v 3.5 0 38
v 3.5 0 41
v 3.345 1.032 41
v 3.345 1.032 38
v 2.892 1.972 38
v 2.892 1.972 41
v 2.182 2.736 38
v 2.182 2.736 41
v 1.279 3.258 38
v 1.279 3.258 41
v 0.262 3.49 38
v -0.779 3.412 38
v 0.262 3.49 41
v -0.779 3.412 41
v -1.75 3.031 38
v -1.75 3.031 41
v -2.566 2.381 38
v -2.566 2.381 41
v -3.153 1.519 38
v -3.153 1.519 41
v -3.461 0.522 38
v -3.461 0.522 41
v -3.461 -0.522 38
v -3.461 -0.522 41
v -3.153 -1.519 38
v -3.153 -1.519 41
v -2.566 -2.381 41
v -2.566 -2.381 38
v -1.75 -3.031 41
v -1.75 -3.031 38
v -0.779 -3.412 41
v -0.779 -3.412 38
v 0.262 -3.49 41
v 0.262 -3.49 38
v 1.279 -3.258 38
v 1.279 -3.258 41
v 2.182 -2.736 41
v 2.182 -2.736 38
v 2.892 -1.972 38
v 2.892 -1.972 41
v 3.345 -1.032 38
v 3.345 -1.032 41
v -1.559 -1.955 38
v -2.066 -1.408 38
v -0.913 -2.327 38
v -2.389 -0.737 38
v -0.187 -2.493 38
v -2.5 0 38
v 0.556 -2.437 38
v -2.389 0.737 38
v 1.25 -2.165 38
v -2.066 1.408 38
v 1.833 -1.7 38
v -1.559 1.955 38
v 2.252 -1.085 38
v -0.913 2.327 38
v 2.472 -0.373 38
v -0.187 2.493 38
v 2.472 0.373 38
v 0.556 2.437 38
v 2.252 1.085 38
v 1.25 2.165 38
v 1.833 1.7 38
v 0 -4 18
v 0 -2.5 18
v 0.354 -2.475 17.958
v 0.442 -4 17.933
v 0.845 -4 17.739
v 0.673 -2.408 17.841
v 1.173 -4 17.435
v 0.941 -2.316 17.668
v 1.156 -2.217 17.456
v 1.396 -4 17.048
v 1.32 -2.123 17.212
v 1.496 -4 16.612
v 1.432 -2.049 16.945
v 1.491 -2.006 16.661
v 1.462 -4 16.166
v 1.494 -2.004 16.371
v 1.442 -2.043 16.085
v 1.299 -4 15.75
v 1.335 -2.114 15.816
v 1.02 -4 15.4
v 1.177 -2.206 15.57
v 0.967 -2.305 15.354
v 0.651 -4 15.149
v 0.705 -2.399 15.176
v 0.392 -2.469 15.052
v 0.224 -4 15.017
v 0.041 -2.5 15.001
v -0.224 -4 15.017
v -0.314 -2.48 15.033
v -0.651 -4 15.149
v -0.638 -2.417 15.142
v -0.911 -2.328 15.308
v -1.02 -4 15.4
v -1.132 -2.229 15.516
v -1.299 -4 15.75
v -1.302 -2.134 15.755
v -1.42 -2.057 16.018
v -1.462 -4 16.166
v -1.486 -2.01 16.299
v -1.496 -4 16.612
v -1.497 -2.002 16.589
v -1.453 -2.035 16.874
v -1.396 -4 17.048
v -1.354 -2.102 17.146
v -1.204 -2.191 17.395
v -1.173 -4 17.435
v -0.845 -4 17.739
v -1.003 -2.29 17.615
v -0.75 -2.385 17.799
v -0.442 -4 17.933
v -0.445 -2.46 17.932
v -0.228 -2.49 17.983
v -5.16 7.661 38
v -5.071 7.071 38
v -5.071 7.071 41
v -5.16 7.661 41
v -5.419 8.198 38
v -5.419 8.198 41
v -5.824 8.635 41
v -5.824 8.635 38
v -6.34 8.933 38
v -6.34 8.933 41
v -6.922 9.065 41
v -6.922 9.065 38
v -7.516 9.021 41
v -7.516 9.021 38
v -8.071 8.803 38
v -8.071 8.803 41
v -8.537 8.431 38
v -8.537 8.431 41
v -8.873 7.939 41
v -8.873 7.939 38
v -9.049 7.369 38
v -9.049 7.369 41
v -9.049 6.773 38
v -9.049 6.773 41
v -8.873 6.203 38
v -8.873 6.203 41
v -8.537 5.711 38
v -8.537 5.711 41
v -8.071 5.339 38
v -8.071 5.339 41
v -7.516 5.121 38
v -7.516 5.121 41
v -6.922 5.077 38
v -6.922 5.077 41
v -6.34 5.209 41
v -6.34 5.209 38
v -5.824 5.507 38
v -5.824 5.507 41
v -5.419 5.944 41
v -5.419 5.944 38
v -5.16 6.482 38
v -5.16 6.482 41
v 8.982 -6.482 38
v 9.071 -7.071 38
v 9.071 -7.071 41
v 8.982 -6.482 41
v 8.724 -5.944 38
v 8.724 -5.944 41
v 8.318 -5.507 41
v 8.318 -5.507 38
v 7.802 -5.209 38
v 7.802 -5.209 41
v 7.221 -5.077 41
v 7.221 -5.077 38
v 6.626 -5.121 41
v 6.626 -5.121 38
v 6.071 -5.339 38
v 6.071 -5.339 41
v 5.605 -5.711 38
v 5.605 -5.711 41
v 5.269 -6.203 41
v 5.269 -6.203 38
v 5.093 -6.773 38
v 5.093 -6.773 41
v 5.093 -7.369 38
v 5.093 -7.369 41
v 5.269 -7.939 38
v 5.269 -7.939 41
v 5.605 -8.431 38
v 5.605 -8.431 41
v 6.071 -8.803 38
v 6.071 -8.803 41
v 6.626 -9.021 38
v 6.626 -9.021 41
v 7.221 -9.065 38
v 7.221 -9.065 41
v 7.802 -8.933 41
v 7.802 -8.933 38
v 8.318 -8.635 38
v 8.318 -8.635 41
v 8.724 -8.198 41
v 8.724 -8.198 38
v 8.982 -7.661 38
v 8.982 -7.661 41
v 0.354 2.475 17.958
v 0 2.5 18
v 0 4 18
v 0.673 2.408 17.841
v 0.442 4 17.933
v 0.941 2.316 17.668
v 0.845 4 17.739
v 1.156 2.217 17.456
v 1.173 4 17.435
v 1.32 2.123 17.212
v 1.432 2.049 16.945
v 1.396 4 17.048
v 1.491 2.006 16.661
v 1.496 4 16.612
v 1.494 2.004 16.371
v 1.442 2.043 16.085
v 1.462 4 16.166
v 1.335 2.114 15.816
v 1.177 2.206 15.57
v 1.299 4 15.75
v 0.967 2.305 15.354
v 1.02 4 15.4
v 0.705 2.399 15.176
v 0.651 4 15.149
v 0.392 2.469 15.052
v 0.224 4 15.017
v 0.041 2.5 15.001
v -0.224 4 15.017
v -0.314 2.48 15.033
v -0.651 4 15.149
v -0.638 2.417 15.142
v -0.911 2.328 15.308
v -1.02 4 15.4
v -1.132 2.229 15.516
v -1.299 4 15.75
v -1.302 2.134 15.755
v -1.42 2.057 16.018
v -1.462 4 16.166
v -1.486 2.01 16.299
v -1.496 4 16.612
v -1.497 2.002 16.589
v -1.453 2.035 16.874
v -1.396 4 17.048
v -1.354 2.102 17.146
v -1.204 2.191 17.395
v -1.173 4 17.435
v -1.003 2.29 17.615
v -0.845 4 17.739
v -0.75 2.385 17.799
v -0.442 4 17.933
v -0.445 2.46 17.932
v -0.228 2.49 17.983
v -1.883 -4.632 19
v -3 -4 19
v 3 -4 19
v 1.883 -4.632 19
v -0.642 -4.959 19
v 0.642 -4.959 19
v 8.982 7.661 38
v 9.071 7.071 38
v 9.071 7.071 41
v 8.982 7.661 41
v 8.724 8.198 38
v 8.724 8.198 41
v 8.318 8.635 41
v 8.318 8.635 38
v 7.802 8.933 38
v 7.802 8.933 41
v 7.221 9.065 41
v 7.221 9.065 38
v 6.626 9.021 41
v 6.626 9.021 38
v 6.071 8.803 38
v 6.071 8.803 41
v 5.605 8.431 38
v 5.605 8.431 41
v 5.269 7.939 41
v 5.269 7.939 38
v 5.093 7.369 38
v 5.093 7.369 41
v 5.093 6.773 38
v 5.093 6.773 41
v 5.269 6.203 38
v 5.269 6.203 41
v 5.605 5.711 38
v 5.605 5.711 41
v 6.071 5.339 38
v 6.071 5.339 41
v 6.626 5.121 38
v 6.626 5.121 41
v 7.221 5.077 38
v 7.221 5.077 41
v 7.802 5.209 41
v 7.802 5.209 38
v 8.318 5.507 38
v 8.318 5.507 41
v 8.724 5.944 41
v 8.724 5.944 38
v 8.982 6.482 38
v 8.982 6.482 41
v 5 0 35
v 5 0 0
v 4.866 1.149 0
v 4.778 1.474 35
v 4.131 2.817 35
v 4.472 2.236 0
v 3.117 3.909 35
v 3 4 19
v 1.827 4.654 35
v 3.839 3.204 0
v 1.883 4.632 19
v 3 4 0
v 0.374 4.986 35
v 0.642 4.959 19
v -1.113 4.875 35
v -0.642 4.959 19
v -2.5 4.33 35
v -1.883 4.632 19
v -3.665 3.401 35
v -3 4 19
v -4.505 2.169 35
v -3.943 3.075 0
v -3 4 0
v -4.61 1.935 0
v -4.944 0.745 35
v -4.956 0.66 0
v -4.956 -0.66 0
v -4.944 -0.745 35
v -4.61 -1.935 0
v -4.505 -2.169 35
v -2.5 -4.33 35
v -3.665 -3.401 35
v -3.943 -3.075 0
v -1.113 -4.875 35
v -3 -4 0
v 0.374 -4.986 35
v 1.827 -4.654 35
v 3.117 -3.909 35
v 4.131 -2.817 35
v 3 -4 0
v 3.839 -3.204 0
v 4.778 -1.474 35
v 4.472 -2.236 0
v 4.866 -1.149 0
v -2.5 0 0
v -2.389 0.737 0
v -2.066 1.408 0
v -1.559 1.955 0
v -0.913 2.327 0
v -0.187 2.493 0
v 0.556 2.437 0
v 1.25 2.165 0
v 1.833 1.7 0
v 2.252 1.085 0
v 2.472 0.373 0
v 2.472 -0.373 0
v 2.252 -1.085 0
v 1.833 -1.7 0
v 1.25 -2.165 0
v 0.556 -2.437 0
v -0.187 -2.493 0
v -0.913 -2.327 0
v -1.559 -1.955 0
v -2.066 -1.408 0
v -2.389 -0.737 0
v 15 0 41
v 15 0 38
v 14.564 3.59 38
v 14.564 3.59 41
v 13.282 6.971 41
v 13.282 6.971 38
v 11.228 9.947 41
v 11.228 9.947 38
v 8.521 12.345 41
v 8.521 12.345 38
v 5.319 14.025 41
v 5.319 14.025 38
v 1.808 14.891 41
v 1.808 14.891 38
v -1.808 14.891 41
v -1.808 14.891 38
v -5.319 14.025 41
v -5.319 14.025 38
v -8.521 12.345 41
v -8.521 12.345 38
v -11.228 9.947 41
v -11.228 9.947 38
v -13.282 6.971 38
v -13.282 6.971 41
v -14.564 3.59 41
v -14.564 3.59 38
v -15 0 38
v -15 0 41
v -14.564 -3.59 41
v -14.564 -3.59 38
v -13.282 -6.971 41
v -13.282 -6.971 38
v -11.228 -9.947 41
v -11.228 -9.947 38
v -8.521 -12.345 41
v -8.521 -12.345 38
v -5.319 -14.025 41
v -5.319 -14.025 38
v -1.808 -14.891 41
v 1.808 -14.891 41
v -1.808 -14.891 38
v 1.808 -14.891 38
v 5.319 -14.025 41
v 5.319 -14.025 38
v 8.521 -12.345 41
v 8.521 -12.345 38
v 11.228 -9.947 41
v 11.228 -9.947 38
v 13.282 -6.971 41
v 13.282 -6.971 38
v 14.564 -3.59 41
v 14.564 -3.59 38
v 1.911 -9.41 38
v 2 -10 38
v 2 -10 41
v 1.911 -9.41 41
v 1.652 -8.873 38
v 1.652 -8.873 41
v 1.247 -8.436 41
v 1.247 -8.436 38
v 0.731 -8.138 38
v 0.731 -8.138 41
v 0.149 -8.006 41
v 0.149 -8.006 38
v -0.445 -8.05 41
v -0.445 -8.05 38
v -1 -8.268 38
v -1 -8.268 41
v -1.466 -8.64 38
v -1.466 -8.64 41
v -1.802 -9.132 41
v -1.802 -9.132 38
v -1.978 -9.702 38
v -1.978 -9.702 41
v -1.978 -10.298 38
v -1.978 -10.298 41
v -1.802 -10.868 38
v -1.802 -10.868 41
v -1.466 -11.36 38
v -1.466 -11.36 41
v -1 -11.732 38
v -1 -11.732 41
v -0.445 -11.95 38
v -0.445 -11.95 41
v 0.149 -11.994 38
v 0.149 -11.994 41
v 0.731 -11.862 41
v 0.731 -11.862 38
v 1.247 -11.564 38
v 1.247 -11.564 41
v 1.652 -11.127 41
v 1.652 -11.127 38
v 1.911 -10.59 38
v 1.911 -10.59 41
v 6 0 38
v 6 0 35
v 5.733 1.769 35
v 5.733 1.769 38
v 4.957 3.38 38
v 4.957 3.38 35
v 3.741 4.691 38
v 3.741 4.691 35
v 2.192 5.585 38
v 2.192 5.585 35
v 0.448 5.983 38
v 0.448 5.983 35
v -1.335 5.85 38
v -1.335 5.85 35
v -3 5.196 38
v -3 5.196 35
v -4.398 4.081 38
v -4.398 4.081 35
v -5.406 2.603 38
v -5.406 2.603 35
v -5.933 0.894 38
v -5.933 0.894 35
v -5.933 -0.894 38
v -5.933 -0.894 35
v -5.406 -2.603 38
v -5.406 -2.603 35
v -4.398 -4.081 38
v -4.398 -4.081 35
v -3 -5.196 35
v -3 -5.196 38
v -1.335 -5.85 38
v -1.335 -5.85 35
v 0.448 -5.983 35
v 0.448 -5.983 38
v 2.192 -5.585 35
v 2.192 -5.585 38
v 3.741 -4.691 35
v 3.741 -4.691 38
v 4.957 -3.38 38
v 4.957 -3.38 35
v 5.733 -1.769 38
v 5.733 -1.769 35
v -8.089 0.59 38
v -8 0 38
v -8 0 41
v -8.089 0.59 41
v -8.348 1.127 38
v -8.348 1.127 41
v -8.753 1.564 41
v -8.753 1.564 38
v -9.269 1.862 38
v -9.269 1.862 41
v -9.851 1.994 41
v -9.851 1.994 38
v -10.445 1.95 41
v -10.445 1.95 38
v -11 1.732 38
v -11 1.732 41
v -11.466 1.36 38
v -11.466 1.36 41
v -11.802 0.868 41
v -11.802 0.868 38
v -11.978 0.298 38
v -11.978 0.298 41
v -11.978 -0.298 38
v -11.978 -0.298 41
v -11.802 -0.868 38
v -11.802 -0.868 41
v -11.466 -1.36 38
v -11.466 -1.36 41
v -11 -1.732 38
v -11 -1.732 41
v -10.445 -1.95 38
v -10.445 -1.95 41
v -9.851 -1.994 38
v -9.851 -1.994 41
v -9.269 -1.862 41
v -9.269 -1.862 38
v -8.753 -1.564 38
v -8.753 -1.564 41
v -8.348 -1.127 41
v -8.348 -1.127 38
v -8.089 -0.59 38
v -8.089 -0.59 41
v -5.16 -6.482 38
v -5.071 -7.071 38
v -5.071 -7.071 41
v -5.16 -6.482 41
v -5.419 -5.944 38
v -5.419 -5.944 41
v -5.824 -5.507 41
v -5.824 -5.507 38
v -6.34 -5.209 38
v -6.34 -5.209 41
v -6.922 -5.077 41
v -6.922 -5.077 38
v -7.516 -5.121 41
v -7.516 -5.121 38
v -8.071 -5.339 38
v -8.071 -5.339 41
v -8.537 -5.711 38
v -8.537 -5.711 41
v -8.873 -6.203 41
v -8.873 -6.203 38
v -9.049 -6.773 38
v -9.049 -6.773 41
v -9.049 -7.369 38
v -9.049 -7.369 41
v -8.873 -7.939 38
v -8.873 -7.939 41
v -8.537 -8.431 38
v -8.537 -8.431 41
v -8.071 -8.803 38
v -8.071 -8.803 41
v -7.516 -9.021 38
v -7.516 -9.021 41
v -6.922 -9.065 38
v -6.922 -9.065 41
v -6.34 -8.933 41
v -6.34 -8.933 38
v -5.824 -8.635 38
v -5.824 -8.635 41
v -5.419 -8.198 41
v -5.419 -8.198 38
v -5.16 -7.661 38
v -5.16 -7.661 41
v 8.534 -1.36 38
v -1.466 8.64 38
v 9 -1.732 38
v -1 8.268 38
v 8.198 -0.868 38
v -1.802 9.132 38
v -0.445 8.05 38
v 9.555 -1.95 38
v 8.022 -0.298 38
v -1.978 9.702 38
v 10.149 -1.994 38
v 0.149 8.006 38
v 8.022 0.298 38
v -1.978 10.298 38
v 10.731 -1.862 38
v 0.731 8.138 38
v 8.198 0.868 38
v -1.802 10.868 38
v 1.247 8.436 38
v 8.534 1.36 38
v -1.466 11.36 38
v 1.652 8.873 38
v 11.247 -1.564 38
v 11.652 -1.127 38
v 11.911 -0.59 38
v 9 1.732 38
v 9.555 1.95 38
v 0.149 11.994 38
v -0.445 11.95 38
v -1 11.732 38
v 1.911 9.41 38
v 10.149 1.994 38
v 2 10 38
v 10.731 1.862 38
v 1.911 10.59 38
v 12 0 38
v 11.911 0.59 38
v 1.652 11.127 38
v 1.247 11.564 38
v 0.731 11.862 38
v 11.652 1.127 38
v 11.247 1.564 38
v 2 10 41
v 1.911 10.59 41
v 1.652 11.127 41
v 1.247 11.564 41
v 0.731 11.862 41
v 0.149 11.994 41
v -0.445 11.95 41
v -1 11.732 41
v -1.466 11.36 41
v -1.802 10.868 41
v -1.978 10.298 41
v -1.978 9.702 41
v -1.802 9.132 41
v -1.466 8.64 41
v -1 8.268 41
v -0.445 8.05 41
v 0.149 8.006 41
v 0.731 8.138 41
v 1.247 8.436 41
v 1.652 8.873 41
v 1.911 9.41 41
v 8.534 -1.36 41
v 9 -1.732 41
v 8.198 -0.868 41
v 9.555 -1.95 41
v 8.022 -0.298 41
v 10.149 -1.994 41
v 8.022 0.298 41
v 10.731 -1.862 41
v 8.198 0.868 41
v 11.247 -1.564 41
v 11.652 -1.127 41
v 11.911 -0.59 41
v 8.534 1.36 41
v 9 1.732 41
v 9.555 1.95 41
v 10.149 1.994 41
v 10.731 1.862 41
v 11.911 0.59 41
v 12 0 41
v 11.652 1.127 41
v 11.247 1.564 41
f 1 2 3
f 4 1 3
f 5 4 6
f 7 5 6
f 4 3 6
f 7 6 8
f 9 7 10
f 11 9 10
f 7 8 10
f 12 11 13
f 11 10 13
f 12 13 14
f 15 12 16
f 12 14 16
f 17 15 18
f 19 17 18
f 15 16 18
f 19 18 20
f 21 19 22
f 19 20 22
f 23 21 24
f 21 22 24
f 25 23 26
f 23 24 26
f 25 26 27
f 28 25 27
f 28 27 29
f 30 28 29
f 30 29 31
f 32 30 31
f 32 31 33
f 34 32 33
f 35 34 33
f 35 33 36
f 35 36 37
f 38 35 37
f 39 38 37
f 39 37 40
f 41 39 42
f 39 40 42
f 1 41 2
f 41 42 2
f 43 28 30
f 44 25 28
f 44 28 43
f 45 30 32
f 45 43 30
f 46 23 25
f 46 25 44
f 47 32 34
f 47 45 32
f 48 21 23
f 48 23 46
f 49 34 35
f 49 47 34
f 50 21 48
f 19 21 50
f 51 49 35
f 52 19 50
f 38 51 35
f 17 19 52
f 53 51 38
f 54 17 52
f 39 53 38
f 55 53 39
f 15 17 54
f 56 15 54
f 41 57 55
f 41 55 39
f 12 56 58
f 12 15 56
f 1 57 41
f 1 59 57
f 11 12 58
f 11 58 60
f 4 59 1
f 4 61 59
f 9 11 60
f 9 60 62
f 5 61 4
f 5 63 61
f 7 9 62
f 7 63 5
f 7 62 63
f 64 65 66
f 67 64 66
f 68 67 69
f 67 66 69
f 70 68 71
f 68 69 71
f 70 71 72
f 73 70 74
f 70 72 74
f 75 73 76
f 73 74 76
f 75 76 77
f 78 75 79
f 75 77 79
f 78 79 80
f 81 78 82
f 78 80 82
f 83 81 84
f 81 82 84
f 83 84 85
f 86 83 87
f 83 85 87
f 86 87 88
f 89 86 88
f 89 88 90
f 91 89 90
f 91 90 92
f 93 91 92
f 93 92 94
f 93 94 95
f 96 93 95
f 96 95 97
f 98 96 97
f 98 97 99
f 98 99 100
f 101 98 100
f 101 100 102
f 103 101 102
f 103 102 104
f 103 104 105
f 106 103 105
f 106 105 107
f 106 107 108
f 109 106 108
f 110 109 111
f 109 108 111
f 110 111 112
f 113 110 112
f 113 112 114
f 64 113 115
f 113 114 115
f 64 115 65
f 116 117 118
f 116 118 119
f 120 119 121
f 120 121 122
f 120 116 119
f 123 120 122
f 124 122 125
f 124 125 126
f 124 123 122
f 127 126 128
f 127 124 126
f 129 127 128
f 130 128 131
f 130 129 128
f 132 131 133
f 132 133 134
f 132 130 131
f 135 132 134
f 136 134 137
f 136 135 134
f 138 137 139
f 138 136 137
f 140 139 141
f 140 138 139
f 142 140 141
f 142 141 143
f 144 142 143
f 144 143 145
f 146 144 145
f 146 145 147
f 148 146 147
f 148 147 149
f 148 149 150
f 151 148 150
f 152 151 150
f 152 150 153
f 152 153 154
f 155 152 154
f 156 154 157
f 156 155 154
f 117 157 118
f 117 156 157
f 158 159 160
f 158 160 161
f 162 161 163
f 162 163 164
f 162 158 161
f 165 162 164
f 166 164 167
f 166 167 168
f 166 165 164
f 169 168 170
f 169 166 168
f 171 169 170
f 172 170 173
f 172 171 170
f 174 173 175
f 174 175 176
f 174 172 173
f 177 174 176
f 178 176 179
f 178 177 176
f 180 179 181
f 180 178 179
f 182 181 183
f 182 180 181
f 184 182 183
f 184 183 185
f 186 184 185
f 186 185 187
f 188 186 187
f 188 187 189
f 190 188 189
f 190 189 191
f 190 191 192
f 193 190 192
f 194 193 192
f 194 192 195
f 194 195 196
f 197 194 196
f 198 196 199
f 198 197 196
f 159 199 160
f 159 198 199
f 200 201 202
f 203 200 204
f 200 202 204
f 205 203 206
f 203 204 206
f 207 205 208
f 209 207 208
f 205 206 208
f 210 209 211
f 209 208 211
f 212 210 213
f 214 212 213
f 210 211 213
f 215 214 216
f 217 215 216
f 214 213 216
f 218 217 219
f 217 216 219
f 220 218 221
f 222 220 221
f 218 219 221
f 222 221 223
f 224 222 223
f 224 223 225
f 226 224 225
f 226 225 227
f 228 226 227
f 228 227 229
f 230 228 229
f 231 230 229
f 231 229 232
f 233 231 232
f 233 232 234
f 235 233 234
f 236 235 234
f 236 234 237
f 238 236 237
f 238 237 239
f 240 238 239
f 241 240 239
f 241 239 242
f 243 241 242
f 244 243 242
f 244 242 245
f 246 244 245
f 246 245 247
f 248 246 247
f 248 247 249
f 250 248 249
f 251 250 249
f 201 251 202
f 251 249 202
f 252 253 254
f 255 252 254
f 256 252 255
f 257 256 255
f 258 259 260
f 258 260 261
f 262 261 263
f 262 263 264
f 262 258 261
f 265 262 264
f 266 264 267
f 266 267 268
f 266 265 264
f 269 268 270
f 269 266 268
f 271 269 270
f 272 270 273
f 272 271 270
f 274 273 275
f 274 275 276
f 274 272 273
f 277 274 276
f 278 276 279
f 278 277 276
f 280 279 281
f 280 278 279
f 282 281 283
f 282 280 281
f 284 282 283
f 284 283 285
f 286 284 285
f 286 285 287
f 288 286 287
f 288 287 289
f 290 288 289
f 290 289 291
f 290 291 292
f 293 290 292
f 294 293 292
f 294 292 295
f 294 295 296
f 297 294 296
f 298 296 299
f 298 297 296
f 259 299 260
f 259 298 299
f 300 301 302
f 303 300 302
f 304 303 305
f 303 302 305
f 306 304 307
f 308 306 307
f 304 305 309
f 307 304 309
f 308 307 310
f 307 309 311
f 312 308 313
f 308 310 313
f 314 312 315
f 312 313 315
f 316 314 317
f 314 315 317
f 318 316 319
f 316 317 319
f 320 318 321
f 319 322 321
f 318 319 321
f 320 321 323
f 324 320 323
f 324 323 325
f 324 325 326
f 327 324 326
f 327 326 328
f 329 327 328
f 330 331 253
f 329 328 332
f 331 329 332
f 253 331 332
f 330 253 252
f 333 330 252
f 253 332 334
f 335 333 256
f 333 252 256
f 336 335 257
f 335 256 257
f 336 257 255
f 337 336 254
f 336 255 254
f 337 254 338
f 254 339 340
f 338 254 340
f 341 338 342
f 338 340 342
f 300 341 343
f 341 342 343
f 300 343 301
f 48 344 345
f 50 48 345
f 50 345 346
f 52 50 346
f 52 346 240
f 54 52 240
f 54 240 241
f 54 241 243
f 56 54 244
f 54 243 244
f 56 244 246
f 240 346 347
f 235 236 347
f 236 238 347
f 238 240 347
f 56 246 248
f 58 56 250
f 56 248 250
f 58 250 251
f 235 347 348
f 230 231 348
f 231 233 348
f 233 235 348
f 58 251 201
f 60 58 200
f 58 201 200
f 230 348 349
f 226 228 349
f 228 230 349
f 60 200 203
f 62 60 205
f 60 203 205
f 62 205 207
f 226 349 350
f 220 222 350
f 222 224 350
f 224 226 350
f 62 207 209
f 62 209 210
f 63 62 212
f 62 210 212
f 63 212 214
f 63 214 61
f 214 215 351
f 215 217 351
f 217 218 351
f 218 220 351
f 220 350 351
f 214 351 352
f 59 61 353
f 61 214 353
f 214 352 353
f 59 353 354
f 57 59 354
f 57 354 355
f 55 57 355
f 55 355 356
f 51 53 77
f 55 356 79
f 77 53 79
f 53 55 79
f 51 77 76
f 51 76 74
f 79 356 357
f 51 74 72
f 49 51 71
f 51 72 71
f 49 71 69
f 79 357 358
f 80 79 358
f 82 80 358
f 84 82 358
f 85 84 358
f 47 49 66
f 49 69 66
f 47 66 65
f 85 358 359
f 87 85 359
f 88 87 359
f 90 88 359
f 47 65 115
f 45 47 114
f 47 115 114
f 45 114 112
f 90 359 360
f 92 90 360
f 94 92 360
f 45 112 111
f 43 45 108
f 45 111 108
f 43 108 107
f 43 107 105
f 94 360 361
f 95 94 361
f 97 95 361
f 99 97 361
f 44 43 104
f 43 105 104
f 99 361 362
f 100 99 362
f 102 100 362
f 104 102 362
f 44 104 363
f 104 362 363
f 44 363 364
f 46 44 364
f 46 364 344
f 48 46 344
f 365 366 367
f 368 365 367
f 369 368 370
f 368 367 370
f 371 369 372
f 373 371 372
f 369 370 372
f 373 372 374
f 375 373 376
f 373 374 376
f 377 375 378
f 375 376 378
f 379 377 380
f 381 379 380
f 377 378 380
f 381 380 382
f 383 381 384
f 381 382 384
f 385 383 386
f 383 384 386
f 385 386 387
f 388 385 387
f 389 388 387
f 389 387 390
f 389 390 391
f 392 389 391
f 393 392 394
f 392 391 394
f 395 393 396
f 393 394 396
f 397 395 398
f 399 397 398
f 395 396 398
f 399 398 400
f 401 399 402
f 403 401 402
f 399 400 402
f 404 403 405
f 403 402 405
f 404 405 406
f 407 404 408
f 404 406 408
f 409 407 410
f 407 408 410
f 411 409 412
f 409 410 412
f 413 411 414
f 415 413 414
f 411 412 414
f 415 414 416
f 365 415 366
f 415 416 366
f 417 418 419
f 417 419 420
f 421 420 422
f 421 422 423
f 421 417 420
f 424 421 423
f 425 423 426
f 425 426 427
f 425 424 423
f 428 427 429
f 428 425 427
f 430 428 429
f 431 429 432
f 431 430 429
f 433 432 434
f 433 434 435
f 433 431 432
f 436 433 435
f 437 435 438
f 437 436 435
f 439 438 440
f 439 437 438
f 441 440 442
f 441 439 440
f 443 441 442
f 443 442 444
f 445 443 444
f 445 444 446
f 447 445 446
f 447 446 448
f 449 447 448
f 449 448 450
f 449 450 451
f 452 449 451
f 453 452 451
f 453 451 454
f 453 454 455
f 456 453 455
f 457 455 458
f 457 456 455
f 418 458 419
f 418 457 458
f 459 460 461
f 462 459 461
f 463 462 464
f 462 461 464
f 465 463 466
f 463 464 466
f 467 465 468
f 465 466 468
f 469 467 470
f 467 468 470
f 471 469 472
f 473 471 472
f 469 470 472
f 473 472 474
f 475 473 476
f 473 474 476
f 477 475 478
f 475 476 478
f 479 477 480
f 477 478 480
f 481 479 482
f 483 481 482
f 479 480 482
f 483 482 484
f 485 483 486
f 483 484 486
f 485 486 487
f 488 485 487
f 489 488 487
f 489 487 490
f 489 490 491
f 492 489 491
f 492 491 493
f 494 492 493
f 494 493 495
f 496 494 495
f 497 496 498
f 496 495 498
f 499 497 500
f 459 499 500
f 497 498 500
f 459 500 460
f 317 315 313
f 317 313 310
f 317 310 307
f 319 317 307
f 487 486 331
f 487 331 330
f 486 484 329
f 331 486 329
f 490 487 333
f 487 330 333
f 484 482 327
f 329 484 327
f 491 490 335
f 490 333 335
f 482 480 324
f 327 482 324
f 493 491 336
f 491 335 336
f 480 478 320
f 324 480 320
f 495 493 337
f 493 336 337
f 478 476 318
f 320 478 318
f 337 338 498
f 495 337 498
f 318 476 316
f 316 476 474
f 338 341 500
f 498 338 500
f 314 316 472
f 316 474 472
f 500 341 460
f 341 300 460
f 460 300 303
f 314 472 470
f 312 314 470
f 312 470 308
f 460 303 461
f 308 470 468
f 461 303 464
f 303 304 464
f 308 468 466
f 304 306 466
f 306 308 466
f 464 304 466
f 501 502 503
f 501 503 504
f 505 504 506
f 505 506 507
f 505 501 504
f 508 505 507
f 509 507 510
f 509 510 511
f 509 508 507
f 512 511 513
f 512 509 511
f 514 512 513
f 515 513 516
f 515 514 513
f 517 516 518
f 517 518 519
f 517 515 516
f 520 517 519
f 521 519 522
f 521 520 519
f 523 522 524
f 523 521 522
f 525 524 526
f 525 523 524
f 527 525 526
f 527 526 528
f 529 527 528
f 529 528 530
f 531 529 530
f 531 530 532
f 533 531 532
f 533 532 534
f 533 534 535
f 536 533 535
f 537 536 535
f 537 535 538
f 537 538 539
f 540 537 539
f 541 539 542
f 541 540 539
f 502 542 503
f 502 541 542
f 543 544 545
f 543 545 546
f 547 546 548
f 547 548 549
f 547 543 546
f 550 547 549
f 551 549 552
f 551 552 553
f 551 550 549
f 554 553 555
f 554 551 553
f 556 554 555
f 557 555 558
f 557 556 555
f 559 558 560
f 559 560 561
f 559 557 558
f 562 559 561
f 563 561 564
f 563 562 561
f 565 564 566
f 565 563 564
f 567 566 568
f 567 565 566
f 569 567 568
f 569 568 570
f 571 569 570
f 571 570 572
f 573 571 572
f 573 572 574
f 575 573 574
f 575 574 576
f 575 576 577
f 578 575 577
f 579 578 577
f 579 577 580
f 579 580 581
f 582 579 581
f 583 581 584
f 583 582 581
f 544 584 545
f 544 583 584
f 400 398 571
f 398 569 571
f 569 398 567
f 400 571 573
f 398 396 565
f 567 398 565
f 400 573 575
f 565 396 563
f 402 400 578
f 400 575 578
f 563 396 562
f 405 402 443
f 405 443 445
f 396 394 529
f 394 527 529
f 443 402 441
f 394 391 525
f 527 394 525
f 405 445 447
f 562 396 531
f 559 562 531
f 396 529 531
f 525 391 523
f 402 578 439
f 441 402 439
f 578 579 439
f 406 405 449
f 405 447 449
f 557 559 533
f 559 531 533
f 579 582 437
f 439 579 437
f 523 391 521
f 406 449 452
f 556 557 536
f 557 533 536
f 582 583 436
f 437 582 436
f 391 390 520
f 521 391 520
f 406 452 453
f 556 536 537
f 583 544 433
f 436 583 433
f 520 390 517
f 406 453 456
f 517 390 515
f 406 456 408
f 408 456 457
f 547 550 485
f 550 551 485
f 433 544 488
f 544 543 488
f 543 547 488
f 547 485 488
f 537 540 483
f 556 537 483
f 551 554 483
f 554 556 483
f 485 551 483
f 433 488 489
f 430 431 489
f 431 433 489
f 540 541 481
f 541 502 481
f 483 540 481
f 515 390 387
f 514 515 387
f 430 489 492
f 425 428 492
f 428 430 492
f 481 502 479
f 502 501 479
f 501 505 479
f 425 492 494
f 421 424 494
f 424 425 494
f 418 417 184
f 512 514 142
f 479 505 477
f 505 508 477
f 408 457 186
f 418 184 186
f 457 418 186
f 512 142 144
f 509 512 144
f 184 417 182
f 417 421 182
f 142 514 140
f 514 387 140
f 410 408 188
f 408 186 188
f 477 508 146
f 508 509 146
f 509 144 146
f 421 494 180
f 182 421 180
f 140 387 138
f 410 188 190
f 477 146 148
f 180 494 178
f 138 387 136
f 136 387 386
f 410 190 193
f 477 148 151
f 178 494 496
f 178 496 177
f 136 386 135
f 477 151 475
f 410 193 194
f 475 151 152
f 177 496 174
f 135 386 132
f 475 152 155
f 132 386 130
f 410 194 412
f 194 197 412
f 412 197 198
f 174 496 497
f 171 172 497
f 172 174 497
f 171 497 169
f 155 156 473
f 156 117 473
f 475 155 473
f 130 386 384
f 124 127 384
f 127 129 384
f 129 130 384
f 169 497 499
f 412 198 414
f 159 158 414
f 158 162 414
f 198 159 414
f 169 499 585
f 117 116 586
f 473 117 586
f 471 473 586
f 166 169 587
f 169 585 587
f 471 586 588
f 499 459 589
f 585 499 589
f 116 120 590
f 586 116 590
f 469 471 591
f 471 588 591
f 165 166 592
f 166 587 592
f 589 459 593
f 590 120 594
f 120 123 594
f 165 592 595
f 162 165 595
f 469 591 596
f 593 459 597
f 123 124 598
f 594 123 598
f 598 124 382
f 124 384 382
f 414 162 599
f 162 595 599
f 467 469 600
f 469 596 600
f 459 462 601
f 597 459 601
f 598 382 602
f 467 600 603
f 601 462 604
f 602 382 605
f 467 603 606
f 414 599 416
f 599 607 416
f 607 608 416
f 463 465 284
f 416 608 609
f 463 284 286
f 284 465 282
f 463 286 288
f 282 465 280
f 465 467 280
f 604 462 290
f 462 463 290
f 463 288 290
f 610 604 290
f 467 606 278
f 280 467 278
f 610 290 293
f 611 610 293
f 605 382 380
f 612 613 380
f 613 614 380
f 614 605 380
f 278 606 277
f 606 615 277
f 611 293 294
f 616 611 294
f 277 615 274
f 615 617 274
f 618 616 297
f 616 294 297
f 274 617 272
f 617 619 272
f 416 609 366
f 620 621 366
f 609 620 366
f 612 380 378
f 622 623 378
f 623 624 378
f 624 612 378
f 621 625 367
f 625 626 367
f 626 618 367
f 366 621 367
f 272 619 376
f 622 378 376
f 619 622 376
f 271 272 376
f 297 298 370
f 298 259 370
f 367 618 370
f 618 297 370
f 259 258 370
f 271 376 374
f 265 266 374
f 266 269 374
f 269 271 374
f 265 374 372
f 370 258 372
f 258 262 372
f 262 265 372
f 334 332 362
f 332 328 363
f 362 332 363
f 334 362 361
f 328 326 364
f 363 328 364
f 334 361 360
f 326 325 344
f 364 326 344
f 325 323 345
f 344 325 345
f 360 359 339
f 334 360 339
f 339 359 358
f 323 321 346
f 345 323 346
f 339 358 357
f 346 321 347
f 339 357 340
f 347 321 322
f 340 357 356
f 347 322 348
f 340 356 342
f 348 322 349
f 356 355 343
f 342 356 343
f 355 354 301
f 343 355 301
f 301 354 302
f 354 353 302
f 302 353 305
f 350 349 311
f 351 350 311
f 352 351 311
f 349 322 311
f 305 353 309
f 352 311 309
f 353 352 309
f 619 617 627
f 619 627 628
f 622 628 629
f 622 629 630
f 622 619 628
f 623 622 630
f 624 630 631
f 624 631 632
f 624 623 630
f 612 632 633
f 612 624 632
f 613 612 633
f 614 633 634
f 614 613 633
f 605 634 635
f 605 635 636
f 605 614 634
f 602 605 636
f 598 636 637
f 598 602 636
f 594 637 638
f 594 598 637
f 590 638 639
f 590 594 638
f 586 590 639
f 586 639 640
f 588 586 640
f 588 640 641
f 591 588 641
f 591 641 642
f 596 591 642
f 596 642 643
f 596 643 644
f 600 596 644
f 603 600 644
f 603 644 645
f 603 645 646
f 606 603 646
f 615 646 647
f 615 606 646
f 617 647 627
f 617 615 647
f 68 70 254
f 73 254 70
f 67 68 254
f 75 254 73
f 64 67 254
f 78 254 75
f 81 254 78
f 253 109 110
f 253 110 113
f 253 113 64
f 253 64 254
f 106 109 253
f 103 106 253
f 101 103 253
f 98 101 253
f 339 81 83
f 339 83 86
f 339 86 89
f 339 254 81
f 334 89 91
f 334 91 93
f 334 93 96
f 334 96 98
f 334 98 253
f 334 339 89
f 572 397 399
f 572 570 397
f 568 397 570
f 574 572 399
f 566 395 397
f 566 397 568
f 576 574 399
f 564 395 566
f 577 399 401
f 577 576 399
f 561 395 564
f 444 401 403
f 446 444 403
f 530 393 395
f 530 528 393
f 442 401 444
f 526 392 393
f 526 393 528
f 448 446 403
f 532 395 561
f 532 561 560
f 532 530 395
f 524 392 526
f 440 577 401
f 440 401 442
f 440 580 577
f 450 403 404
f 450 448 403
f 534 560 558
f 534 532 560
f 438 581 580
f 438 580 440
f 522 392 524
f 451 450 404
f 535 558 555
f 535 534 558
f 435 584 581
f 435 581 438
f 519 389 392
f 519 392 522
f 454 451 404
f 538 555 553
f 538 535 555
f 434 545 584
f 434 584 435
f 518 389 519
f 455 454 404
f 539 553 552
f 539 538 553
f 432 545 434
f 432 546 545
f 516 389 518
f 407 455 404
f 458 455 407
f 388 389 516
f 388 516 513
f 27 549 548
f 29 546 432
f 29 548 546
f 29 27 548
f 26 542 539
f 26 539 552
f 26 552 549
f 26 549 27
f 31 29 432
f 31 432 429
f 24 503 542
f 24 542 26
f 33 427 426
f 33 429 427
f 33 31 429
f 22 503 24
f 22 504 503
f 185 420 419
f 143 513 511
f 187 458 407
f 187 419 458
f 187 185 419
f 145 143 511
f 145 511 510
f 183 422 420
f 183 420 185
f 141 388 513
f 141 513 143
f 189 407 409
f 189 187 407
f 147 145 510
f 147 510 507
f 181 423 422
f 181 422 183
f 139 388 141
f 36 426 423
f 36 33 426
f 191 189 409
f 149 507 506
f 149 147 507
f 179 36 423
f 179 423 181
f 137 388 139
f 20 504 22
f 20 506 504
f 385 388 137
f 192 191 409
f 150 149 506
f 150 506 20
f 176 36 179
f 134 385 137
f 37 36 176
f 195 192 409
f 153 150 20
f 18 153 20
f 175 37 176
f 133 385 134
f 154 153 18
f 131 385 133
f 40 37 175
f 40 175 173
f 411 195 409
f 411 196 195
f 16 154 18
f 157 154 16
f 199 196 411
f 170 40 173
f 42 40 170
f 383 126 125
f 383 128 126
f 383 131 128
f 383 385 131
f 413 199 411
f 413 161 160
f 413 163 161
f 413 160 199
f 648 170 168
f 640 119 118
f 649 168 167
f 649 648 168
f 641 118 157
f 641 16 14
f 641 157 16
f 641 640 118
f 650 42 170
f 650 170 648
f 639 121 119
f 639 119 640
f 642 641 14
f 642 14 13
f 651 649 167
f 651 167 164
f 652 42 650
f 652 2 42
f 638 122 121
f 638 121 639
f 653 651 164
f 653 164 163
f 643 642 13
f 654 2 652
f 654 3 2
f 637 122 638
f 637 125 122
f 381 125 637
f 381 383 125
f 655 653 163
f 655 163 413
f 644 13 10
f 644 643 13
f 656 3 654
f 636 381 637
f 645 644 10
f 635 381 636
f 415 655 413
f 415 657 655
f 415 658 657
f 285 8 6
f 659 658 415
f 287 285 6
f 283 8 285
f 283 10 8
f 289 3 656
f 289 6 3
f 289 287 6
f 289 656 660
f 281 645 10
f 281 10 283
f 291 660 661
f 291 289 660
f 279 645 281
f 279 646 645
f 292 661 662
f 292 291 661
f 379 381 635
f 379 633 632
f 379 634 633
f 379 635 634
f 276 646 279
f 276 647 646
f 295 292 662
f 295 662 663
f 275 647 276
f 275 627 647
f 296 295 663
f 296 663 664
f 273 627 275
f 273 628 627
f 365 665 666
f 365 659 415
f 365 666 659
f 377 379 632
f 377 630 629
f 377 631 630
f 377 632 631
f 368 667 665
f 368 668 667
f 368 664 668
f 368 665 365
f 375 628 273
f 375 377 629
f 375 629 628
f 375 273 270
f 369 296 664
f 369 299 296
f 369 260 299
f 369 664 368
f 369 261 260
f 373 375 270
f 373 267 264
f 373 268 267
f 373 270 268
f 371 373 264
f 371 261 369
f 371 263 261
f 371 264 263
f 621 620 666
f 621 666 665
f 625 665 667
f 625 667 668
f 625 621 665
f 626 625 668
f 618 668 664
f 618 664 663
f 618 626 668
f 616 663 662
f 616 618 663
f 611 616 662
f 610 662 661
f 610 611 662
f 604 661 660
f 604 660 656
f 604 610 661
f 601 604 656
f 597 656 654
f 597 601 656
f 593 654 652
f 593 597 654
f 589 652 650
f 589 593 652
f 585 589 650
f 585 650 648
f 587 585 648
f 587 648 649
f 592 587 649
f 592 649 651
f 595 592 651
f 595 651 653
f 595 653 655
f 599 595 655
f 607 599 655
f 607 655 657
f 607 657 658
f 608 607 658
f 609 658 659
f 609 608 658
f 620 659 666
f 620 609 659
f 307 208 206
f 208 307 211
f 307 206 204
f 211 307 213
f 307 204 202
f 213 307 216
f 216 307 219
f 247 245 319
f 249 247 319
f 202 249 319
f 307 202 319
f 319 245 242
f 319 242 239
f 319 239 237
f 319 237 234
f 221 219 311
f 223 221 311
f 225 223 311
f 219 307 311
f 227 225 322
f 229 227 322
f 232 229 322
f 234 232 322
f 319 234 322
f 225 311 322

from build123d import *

# Parameters (mm, degrees)
SKETCH_1_R          = 5
EXTRUDE_1_DEPTH     = 35
SKETCH_2_R          = 6
EXTRUDE_2_DEPTH     = 3
SKETCH_3_R          = 15
SKETCH_3_R_2        = 2
EXTRUDE_3_DEPTH     = 3
CUT_EXTRUDE_1_DEPTH = 19
SKETCH_5_R          = 1.5
CUT_EXTRUDE_2_DEPTH = 48.613023428
SKETCH_6_R          = 2.5
CUT_EXTRUDE_3_DEPTH = 47.16275555
SKETCH_7_R          = 3.5
CUT_EXTRUDE_4_DEPTH = 3


with BuildPart() as part:
    # 草图1 → 凸台-拉伸1 (new body)
    with BuildSketch(Plane.XY):
        Circle(SKETCH_1_R)
    extrude(amount=EXTRUDE_1_DEPTH)

    # 草图2 → 凸台-拉伸2 (add)
    with BuildSketch(Plane.XY.offset(35)):
        Circle(SKETCH_2_R)
    extrude(amount=EXTRUDE_2_DEPTH)

    # 草图3 → 凸台-拉伸3 (add)
    with BuildSketch(Plane.XY.offset(38)):
        Circle(SKETCH_3_R)
        with Locations((0, 10)):
            Circle(SKETCH_3_R_2, mode=Mode.SUBTRACT)
        with Locations((10, 0)):
            Circle(SKETCH_3_R_2, mode=Mode.SUBTRACT)
        with Locations((0, -10)):
            Circle(SKETCH_3_R_2, mode=Mode.SUBTRACT)
        with Locations((-10, 0)):
            Circle(SKETCH_3_R_2, mode=Mode.SUBTRACT)
        with Locations((7.071067812, 7.071067812)):
            Circle(SKETCH_3_R_2, mode=Mode.SUBTRACT)
        with Locations((7.071067812, -7.071067812)):
            Circle(SKETCH_3_R_2, mode=Mode.SUBTRACT)
        with Locations((-7.071067812, -7.071067812)):
            Circle(SKETCH_3_R_2, mode=Mode.SUBTRACT)
        with Locations((-7.071067812, 7.071067812)):
            Circle(SKETCH_3_R_2, mode=Mode.SUBTRACT)
    extrude(amount=EXTRUDE_3_DEPTH)

    # 草图4 → 切除-拉伸1 (cut)
    with BuildSketch(Plane(origin=(0, 0, 0), x_dir=(-1, 0, 0), z_dir=(0, 0, -1))):
        with BuildLine():
            Line((-3, 4), (3, 4))
            ThreePointArc((3, 4), (0, 5), (-3, 4))
        make_face()
        with BuildLine():
            Line((-3, -4), (3, -4))
            ThreePointArc((3, -4), (0, -5), (-3, -4))
        make_face()
    extrude(amount=-CUT_EXTRUDE_1_DEPTH, mode=Mode.SUBTRACT)

    # 草图5 → 切除-拉伸2 (cut, through all)
    with BuildSketch(Plane(origin=(0, 4, 0), x_dir=(1, 0, 0), z_dir=(0, 1, 0))):
        with Locations(Location((0, -16.5, 0), (0, 0, 270))):
            Circle(SKETCH_5_R)
    extrude(amount=-CUT_EXTRUDE_2_DEPTH, mode=Mode.SUBTRACT)

    # 草图6 → 切除-拉伸3 (cut, through all)
    with BuildSketch(Plane(origin=(0, 0, 0), x_dir=(-1, 0, 0), z_dir=(0, 0, -1))):
        Circle(SKETCH_6_R)
    extrude(amount=-CUT_EXTRUDE_3_DEPTH, mode=Mode.SUBTRACT)

    # 草图7 → 切除-拉伸4 (cut)
    with BuildSketch(Plane.XY.offset(41)):
        Circle(SKETCH_7_R)
    extrude(amount=-CUT_EXTRUDE_4_DEPTH, mode=Mode.SUBTRACT)


solid = part.part
